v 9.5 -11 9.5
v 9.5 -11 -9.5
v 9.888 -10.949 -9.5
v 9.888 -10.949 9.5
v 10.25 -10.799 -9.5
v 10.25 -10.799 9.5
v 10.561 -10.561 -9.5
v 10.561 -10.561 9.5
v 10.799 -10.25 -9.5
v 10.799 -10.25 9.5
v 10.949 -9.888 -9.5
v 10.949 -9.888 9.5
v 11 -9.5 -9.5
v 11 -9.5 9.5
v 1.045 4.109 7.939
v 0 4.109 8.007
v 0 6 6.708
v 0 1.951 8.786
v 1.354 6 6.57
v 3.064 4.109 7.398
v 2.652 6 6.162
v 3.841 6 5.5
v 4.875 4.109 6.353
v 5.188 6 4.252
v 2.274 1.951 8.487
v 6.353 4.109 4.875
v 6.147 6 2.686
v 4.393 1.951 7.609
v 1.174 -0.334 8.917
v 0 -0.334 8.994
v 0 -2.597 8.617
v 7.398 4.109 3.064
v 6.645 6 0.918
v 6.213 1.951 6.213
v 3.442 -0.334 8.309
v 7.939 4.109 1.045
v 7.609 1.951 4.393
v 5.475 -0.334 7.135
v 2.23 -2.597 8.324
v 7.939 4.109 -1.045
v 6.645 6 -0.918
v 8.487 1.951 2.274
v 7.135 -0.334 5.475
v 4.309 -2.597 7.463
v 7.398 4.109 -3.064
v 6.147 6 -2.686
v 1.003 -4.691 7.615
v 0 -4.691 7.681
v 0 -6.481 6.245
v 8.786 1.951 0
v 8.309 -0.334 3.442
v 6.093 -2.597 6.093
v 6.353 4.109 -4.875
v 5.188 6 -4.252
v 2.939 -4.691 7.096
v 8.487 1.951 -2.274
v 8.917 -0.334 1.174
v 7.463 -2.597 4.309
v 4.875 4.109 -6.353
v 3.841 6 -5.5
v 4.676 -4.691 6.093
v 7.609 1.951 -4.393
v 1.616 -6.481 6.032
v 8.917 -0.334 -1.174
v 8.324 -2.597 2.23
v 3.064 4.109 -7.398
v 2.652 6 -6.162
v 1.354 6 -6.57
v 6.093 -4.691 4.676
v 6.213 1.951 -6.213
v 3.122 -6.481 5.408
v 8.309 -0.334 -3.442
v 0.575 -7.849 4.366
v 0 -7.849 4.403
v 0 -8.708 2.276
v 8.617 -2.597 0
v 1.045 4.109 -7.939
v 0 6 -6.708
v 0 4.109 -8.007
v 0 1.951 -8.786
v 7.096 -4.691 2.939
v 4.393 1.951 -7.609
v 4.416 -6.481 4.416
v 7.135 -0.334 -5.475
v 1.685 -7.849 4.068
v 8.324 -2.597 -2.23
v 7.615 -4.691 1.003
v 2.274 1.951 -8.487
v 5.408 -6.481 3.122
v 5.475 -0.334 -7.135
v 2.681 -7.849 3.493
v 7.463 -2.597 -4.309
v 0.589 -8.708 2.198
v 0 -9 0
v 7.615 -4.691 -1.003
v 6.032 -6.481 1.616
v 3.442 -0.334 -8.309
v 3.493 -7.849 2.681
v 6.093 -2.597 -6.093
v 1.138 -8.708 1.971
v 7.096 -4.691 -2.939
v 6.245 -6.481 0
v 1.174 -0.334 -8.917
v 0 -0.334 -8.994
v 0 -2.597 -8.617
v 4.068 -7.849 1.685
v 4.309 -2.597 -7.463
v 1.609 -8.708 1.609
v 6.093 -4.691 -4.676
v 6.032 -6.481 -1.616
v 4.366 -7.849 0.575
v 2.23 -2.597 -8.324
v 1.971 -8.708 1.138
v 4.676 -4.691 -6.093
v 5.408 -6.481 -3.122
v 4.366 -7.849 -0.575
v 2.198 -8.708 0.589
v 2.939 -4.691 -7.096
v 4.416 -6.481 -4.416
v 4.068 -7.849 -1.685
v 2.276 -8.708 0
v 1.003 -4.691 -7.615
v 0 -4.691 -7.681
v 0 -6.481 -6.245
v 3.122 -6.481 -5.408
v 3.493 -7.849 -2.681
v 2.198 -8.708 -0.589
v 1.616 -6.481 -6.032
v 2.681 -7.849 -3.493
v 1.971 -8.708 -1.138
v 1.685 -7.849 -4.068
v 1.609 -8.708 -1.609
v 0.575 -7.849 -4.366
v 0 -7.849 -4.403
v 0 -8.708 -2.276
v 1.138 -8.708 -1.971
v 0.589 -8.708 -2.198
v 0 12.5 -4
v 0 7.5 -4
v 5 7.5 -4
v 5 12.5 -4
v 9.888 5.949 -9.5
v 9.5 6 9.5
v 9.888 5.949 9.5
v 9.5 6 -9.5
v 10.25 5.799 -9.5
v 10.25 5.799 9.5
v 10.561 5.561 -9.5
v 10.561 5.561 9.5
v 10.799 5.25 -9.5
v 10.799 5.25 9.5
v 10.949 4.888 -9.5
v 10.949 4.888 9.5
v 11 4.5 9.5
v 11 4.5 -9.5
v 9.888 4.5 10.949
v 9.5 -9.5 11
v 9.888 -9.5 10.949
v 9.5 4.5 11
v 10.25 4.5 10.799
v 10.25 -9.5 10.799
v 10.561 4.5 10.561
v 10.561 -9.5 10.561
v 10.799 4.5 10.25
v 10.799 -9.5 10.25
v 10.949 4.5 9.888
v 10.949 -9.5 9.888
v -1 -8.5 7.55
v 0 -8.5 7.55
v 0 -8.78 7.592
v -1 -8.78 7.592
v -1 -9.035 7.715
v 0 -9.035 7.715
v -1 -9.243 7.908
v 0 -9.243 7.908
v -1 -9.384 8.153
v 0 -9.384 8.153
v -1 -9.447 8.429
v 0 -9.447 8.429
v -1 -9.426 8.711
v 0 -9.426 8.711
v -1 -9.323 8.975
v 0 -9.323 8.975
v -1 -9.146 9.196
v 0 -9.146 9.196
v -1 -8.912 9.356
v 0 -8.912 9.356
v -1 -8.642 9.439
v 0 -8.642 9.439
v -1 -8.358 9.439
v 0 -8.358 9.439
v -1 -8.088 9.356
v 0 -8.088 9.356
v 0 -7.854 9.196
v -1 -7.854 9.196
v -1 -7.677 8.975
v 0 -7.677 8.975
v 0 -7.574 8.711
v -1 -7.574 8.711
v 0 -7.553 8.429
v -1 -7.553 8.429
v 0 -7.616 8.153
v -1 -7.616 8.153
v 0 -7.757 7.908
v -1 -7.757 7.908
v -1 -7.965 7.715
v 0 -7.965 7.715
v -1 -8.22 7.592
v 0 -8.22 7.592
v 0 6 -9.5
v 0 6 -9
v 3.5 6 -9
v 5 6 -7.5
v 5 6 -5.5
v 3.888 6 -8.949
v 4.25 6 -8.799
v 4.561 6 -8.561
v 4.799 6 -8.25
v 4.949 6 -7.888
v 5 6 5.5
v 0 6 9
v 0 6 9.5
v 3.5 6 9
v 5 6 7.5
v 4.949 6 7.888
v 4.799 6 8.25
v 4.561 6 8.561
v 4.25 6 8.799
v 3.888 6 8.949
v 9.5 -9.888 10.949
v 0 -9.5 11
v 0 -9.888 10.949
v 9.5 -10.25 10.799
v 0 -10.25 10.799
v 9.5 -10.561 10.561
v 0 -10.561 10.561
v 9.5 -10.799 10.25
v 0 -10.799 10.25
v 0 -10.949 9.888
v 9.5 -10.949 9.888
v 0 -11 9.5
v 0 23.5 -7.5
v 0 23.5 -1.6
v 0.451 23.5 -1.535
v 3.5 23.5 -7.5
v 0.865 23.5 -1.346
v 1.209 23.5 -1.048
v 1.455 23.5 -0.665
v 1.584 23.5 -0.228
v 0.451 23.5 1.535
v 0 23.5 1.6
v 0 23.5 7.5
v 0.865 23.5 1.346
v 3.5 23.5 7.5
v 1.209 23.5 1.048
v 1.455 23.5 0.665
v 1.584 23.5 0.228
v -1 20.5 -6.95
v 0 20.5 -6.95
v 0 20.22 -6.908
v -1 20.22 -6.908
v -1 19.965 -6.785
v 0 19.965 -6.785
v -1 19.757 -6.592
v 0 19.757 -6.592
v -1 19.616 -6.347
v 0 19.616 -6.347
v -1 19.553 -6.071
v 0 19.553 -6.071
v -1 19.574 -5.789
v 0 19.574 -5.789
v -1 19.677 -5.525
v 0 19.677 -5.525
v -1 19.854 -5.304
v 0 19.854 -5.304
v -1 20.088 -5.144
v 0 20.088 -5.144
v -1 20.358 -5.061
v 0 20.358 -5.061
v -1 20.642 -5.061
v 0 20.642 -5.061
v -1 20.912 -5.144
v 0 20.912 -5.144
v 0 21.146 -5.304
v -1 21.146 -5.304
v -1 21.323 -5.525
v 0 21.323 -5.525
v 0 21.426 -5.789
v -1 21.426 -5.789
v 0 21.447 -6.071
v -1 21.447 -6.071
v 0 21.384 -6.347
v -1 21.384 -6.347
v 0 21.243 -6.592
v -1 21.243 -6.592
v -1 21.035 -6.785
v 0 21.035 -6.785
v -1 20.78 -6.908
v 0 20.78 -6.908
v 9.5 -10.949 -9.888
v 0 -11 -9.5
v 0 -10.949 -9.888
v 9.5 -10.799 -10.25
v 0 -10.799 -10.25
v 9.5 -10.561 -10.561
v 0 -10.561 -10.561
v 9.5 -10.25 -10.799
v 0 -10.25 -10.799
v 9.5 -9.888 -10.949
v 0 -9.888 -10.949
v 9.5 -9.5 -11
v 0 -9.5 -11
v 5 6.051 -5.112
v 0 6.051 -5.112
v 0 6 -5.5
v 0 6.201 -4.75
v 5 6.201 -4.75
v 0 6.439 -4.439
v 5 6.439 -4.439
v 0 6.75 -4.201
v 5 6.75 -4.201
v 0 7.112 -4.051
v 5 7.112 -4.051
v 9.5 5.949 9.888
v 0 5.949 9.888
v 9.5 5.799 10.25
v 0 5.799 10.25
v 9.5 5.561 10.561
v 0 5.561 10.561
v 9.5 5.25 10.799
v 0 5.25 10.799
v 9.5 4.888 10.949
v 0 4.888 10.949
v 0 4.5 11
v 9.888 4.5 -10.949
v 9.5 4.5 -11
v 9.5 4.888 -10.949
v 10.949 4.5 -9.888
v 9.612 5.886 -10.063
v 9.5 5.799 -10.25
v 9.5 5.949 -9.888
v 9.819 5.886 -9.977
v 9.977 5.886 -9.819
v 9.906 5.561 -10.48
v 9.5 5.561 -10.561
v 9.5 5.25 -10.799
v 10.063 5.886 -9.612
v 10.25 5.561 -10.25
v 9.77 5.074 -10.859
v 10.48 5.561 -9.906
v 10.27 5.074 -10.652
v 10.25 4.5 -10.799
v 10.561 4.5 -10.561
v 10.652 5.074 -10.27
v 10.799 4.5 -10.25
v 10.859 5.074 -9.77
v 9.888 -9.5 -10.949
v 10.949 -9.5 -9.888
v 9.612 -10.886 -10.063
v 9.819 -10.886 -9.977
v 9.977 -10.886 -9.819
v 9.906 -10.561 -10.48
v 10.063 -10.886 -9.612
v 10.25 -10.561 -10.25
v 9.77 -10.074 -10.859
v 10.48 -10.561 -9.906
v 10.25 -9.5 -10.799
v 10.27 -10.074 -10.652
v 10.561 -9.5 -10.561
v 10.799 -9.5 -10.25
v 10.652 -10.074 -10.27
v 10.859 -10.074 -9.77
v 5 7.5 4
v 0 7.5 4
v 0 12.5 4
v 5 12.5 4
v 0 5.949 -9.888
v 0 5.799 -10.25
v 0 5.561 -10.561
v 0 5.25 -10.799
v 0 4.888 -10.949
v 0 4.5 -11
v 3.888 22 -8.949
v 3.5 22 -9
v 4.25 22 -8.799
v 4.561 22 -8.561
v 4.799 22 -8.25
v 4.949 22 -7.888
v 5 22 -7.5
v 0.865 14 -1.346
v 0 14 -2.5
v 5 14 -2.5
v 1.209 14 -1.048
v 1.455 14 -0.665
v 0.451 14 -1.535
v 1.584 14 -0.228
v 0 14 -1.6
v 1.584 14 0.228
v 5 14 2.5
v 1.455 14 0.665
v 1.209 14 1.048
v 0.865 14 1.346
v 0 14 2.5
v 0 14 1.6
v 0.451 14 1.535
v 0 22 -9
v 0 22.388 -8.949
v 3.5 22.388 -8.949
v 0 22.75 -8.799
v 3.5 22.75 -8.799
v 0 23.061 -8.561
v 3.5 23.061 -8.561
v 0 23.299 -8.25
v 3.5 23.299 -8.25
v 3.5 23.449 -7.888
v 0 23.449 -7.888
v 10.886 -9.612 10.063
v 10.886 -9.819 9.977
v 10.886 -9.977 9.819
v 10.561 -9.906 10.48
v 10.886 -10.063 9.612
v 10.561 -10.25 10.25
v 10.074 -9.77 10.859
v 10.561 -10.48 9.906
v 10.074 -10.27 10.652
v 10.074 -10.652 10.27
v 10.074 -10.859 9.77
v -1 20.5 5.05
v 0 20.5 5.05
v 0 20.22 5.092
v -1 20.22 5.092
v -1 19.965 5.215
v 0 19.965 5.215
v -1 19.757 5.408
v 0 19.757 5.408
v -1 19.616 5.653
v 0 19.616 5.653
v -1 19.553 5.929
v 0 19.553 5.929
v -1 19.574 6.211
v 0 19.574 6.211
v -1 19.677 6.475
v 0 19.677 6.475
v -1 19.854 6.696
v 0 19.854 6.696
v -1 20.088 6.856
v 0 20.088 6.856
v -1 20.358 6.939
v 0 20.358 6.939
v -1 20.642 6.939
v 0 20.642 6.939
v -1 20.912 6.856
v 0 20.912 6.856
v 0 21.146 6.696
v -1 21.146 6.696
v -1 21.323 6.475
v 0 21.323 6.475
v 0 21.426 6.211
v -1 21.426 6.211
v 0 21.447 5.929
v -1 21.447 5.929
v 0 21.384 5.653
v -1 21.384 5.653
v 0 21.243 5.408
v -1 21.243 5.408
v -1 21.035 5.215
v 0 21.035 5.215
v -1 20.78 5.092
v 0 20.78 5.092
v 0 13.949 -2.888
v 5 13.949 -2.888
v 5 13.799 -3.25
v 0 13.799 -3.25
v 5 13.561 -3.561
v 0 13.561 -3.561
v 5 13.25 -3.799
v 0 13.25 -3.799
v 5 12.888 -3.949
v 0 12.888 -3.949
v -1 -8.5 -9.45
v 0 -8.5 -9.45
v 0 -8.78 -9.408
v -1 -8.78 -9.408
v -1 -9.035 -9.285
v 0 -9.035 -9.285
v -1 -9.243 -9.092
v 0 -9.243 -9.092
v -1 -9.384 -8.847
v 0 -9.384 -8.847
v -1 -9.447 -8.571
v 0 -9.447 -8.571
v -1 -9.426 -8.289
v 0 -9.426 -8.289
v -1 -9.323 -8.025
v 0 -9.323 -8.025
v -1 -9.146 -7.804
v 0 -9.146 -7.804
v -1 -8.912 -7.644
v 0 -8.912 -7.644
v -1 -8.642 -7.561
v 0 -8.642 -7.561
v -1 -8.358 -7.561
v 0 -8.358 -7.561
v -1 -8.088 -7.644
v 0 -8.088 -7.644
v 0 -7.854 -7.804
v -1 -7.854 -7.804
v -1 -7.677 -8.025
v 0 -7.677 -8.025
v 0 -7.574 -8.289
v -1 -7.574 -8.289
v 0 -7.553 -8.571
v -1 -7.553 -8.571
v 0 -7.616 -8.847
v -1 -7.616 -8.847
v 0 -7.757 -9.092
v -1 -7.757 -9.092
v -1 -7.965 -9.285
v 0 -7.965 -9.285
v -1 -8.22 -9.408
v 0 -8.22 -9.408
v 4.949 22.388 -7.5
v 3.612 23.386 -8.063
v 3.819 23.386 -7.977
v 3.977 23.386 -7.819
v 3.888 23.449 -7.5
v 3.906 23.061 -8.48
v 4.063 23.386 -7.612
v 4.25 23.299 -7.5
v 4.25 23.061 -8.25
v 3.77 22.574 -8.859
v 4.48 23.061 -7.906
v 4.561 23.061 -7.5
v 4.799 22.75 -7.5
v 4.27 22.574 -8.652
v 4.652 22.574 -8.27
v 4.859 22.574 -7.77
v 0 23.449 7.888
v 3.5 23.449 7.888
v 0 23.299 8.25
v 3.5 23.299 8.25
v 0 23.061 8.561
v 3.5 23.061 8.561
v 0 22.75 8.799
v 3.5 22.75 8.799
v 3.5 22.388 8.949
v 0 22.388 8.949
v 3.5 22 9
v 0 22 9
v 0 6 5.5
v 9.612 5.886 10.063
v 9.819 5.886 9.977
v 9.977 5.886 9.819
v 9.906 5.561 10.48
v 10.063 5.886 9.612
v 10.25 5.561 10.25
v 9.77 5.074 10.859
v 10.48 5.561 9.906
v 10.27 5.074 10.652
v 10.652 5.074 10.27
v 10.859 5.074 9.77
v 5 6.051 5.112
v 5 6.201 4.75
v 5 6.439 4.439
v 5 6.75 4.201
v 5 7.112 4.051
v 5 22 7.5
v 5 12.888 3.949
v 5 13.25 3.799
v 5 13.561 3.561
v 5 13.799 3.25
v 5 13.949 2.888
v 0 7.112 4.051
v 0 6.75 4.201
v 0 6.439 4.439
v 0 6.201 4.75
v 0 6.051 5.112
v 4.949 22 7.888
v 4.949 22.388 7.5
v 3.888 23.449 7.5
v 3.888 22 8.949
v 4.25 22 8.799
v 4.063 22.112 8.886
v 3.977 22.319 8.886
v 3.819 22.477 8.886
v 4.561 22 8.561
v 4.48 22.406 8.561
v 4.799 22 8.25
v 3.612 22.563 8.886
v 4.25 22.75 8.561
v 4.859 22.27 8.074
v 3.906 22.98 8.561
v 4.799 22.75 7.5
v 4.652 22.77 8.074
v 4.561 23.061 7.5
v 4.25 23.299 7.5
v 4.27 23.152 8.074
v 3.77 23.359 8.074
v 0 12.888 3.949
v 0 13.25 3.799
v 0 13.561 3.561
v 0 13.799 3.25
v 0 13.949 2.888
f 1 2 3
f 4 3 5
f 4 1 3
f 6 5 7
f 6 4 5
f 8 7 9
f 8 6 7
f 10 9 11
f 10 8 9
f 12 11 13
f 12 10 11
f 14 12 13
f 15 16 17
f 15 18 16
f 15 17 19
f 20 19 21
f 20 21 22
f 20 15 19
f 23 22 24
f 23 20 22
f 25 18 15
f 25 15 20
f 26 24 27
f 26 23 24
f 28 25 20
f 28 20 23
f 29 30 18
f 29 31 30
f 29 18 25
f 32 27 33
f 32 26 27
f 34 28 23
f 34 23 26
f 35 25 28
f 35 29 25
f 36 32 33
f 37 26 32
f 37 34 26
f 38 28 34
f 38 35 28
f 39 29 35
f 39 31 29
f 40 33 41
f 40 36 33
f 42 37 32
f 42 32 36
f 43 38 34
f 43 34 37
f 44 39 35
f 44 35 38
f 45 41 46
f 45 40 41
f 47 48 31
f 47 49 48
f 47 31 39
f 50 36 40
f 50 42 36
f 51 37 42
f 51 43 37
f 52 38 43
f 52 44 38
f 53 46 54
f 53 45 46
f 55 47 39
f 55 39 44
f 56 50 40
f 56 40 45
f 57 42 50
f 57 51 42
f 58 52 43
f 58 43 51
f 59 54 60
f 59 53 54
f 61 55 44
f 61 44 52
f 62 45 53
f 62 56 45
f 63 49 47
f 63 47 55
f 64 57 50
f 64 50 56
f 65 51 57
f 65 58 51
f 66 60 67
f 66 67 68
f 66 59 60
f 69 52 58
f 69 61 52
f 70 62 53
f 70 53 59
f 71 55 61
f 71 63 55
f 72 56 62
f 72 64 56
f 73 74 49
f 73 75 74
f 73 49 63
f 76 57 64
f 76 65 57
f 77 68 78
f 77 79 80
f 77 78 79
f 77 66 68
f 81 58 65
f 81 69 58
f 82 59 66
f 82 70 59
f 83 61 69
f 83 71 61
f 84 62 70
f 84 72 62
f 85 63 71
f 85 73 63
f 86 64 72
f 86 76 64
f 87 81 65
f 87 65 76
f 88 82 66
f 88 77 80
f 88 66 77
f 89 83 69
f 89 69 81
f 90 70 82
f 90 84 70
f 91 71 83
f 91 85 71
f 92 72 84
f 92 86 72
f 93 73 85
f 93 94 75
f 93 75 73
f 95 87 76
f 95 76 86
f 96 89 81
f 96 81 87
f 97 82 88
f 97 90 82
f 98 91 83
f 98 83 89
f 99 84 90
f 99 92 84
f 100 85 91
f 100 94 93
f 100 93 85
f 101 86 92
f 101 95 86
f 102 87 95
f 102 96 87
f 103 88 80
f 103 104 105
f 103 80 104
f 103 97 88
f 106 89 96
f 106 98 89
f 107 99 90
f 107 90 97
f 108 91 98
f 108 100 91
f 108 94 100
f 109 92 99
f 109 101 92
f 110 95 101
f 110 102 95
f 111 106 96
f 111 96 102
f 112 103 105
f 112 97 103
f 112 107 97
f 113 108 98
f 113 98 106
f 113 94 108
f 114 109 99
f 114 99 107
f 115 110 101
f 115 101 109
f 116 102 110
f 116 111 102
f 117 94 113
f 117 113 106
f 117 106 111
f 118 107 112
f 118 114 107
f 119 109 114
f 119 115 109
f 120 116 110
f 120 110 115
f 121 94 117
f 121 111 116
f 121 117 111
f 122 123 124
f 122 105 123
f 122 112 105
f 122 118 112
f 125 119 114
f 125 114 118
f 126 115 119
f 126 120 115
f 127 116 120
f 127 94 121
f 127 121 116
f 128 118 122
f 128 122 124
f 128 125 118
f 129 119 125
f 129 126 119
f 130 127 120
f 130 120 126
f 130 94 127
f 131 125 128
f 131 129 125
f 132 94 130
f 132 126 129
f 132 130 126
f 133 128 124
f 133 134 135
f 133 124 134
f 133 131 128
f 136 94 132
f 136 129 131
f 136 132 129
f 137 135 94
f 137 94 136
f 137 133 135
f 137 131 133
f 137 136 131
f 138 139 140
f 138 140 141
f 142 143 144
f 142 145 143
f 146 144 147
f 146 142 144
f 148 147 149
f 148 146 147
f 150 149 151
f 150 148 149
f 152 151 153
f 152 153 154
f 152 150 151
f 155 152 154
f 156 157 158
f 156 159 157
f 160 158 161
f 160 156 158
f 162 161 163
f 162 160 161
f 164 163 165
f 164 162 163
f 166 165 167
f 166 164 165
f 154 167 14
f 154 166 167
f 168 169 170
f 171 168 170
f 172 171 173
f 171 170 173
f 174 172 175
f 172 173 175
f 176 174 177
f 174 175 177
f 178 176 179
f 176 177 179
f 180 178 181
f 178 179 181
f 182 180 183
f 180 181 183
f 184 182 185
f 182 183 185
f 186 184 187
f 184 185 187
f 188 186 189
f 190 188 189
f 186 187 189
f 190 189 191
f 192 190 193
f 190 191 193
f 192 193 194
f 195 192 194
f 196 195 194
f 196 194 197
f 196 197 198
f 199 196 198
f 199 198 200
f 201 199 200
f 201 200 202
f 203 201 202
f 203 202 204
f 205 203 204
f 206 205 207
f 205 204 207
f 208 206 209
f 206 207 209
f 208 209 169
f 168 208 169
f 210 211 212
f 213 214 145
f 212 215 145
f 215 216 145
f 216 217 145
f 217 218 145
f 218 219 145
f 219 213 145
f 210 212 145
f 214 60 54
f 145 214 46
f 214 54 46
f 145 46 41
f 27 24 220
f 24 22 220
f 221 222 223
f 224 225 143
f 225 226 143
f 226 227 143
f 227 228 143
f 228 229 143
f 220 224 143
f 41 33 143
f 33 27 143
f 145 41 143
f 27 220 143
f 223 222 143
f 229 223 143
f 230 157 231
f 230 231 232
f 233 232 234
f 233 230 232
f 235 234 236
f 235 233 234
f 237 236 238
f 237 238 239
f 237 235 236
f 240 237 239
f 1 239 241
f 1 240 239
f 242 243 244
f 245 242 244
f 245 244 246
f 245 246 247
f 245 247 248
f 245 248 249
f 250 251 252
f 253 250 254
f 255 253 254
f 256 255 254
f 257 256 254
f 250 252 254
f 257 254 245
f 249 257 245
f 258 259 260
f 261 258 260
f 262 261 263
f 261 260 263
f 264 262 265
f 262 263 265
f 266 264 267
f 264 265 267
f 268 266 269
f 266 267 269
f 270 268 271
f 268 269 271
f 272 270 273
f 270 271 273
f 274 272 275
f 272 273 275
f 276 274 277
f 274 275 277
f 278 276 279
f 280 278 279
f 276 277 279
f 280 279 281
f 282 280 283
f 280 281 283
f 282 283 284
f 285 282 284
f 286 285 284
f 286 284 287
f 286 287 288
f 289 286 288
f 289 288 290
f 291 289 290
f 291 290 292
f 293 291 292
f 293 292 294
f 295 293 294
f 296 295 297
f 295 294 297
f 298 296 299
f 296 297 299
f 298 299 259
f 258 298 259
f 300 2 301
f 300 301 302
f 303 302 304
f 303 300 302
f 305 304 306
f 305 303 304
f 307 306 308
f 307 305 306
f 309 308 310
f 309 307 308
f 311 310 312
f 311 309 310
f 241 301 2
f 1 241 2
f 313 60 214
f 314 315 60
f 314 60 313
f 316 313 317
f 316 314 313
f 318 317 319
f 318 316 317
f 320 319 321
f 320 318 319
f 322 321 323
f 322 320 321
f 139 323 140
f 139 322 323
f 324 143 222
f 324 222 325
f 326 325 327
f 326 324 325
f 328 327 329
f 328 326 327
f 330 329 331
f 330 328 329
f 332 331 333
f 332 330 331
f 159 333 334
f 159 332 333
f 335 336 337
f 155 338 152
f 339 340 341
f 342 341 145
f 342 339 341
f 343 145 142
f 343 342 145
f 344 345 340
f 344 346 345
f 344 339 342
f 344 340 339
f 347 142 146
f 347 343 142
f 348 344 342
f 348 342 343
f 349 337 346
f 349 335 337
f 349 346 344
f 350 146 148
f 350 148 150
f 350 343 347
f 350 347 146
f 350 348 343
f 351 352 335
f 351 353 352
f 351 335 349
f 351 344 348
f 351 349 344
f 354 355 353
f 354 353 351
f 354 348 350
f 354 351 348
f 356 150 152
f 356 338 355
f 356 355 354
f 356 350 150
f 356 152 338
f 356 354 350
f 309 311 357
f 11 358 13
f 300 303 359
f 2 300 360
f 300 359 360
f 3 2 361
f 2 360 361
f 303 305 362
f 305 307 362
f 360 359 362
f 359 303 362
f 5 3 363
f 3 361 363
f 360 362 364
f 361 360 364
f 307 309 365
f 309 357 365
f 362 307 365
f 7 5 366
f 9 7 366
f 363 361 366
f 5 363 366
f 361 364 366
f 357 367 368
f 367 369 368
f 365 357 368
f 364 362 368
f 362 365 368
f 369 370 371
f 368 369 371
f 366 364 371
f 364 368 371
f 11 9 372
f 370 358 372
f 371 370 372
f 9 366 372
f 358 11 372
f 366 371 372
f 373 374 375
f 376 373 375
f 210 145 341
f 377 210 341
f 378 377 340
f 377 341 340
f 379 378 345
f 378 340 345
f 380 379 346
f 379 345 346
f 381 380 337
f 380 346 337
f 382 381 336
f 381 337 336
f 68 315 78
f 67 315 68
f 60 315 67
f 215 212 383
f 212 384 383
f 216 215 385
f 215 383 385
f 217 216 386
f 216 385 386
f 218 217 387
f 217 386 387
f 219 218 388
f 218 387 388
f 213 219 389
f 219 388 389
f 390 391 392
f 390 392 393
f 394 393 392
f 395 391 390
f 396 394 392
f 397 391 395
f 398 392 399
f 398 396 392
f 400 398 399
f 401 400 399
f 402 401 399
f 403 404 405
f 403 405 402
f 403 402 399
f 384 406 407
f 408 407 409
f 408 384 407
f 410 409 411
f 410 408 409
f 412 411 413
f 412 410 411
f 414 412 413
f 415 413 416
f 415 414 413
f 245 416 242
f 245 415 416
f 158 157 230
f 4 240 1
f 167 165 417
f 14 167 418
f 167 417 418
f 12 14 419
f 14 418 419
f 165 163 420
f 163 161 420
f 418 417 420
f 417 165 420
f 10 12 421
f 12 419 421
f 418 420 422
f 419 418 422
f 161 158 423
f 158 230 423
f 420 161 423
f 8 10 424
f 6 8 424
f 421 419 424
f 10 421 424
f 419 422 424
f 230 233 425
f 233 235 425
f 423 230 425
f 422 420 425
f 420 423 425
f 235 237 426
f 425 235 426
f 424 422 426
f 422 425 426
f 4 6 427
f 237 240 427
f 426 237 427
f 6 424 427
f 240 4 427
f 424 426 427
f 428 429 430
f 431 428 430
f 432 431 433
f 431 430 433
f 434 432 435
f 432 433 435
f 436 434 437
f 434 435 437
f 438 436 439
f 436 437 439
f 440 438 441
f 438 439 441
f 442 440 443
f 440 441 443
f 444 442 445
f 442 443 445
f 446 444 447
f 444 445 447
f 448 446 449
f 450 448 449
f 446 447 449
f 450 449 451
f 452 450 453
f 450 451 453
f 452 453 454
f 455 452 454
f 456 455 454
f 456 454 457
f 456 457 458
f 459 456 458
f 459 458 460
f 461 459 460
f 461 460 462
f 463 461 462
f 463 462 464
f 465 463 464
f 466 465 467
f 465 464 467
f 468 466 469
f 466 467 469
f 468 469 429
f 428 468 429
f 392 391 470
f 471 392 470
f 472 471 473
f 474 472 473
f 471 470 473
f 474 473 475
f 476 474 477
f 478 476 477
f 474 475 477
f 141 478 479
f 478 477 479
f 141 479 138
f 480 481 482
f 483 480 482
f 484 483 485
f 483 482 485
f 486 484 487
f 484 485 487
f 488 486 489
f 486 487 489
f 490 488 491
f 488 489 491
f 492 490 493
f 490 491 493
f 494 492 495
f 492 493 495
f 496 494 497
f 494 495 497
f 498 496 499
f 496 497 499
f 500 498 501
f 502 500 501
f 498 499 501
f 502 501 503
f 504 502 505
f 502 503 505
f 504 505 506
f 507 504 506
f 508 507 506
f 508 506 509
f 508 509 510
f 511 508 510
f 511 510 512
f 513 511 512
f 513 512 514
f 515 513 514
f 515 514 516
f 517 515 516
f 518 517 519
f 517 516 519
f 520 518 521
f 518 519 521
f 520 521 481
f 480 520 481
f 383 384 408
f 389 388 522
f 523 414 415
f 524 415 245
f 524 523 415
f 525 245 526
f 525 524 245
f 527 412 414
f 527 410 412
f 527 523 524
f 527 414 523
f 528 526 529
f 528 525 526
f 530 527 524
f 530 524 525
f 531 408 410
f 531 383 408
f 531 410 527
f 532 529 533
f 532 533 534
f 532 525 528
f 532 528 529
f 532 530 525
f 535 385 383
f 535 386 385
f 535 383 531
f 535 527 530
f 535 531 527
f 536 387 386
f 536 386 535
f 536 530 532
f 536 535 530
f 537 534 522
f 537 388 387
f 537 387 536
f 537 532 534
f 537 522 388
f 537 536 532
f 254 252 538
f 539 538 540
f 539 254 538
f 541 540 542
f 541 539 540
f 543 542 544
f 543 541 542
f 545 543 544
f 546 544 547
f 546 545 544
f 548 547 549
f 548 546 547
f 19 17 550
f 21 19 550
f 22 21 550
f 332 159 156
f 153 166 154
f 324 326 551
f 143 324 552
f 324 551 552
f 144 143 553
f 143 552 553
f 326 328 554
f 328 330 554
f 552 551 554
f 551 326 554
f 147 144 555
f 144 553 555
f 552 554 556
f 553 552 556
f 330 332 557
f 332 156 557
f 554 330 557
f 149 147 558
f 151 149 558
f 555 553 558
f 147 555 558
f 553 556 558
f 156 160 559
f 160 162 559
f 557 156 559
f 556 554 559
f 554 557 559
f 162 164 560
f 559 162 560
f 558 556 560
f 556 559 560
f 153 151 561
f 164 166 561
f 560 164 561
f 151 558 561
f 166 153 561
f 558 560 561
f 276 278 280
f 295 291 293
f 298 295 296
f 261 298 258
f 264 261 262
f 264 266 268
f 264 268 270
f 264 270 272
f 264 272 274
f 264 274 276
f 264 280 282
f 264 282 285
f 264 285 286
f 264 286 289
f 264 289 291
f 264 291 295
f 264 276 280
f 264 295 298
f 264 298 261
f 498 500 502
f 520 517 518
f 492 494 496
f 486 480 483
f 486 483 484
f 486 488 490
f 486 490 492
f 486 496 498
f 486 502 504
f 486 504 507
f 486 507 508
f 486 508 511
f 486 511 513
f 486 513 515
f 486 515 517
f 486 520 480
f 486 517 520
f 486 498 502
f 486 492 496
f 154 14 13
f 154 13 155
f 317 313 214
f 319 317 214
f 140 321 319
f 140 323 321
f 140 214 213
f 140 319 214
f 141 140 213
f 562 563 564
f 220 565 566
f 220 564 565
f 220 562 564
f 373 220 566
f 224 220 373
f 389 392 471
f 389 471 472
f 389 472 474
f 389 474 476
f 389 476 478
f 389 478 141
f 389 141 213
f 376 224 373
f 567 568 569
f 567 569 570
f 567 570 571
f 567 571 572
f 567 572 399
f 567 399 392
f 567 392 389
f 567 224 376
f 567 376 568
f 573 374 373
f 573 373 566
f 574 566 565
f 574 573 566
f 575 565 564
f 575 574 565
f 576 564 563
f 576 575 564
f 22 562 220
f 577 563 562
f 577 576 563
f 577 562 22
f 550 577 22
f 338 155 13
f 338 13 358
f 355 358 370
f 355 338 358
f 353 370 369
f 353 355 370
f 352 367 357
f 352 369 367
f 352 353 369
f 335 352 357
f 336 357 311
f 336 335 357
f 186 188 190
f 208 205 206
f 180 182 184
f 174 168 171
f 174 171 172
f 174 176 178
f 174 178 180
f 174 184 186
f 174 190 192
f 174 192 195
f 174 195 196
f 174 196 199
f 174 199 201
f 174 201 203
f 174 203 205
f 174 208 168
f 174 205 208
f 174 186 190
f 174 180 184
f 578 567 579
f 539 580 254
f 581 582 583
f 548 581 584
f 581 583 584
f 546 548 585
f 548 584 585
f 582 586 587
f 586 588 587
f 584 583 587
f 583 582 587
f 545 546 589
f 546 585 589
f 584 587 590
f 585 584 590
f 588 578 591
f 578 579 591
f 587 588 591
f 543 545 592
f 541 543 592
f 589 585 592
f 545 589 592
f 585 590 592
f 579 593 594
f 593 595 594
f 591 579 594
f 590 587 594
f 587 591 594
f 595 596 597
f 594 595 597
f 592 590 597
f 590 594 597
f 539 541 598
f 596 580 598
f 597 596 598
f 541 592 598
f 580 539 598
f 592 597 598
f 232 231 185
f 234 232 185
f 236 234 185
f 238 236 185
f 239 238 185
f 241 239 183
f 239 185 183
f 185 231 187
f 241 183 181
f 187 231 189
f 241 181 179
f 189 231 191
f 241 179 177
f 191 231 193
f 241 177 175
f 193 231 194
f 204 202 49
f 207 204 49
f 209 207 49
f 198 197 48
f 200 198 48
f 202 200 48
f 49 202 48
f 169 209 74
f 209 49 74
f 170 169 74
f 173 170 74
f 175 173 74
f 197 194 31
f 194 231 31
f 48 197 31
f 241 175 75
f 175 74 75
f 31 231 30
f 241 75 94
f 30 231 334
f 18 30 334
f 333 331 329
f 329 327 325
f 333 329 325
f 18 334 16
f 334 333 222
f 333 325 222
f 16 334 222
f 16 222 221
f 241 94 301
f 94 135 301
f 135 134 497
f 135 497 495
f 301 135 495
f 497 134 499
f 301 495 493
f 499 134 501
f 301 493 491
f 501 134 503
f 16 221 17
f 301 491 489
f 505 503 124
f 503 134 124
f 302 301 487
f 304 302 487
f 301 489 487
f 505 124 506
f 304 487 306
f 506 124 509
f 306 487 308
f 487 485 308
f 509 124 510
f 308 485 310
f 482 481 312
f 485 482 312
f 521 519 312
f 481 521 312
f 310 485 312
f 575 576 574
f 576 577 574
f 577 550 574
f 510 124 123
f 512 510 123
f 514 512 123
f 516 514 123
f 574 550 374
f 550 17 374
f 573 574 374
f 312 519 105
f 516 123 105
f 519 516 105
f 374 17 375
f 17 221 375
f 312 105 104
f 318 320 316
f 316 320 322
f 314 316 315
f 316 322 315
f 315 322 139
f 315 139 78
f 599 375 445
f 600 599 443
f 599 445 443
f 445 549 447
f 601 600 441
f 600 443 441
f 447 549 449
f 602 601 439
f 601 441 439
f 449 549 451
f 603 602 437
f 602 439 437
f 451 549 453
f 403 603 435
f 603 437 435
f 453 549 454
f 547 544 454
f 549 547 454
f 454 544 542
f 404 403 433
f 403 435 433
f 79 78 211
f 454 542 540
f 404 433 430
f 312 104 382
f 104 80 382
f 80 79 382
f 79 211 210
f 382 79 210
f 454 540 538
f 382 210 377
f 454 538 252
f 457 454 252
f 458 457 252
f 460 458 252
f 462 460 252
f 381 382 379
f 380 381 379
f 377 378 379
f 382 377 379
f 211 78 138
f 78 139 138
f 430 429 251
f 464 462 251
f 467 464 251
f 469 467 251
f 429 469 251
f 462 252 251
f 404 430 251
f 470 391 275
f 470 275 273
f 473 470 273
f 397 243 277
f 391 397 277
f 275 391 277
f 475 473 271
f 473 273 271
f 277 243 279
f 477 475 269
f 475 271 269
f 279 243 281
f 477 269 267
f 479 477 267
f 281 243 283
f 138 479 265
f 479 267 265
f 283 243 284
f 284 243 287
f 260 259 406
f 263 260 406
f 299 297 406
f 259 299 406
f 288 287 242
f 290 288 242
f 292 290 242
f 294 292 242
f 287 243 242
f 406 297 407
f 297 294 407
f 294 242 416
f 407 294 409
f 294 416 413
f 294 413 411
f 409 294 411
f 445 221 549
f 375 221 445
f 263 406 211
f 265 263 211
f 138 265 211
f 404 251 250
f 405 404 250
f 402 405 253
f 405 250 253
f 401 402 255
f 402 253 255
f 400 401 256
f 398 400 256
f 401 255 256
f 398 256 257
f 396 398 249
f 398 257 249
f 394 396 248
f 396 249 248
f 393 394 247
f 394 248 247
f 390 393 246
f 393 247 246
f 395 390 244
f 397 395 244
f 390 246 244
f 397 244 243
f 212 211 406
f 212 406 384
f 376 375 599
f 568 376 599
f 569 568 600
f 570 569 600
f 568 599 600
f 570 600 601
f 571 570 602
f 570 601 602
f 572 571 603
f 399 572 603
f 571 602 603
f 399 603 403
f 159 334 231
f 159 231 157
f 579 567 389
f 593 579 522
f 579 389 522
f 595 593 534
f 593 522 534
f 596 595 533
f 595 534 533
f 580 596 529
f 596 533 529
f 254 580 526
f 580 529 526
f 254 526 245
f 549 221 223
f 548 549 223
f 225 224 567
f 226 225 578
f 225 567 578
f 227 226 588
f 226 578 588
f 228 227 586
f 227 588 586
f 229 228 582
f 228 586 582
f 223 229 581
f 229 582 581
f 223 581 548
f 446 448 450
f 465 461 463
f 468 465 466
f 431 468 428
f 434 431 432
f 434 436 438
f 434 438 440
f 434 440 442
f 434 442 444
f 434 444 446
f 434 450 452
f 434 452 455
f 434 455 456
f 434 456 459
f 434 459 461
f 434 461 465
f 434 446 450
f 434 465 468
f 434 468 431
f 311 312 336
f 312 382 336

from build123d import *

# Parameters (mm, degrees)
SKETCH_1_W          = 22
SKETCH_1_H          = 17
EXTRUDE_1_DEPTH     = 11
SKETCH_3_W          = 10
SKETCH_3_H          = 17.5
EXTRUDE_2_DEPTH     = 9
SKETCH_4_R          = 1.6
CUT_EXTRUDE_1_DEPTH = 22
SKETCH_5_W          = 8
SKETCH_5_H          = 8
CUT_EXTRUDE_2_DEPTH = 22
FILLET_1_R          = 1.5
FILLET_START        = -6
FILLET_2_DEPTH      = 11
FILLET_START_2      = -5
FILLET_2_2_DEPTH    = 10
SKETCH_7_W          = 37.569031752
SKETCH_7_H          = 53.082934042
CUT_EXTRUDE_4_DEPTH = 22
SKETCH_8_R          = 0.95
EXTRUDE_3_DEPTH     = 1


with BuildPart() as part:
    # 草图1 → 凸台-拉伸1 (new, symmetric)
    with BuildSketch(Plane.XY):
        with Locations((0, -2.5)):
            Rectangle(SKETCH_1_W, SKETCH_1_H)
    extrude(amount=EXTRUDE_1_DEPTH, both=True)

    # 草图2 → 切除-旋转1 (revolve, cut)
    with BuildSketch(Plane.XY, mode=Mode.PRIVATE) as cut_revolve_1_sk:
        with BuildLine():
            Line((0, 6), (6.708203932, 6))
            ThreePointArc((6.708203932, 6), (8.215838363, -3.674234614), (0, -9))
            Line((0, -9), (0, 6))
        make_face()
    revolve(cut_revolve_1_sk.sketch.rotate(Axis((0, 0, 0), (0, 1, 0)), 180), axis=Axis((0, 0, 0), (0, 1, 0)), mode=Mode.SUBTRACT)

    # 草图3 → 凸台-拉伸2 (add, symmetric)
    with BuildSketch(Plane.XY):
        with Locations((0, 14.75)):
            Rectangle(SKETCH_3_W, SKETCH_3_H)
    extrude(amount=EXTRUDE_2_DEPTH, both=True)

    # 草图4 → 切除-拉伸1 (cut)
    with BuildSketch(Plane(origin=(0, 23.5, 0), x_dir=(1, 0, 0), z_dir=(0, 1, 0))):
        with Locations(Location((0, 0, 0), (0, 0, 180))):
            Circle(SKETCH_4_R)
    extrude(amount=-CUT_EXTRUDE_1_DEPTH, mode=Mode.SUBTRACT)

    # 草图5 → 切除-拉伸2 (cut)
    with BuildSketch(Plane.ZY.offset(5)):
        with Locations((0, 10)):
            Rectangle(SKETCH_5_W, SKETCH_5_H)
    extrude(amount=-CUT_EXTRUDE_2_DEPTH, mode=Mode.SUBTRACT)

    # 圆角1
    fillet_1_edges = [part.edges().sort_by_distance(p)[0] for p in [
        (0, -11, 11),
        (11, -2.5, 11),
        (5, 14.75, -9),
        (0, 23.5, -9),
        (5, 23.5, 0),
        (-5, 14.75, -9),
        (-5, 23.5, 0),
        (5, 14.75, 9),
        (0, 23.5, 9),
        (-5, 14.75, 9),
        (0, 6, 11),
        (11, -2.5, -11),
        (0, -11, -11),
        (-11, -2.5, -11),
        (0, 6, -11),
        (11, 6, 0),
        (11, -11, 0),
        (-11, -11, 0),
        (-11, 6, 0),
        (-11, -2.5, 11),
    ]]
    fillet(fillet_1_edges, radius=FILLET_1_R)

    # 圆角2: read off the stored shape, not the designer's step
    # 圆角2 outline → 圆角2 (cut)
    with BuildSketch(Plane.YZ.offset(FILLET_START)):
        with BuildLine():
            Line((6, -4), (6, -5.5))
            ThreePointArc((6, -5.5), (6.439339828, -4.439339828), (7.5, -4))
            Line((7.5, -4), (6, -4))
        make_face()
        with BuildLine():
            Line((6, 4), (7.5, 4))
            ThreePointArc((7.5, 4), (6.439339828, 4.439339828), (6, 5.5))
            Line((6, 5.5), (6, 4))
        make_face()
    extrude(amount=FILLET_2_DEPTH, mode=Mode.SUBTRACT)

    # Fillet 2 2 outline → Fillet 2 2 (add)
    with BuildSketch(Plane.YZ.offset(FILLET_START_2)):
        with BuildLine():
            ThreePointArc((12.5, 4), (13.560660172, 3.560660172), (14, 2.5))
            Line((14, 2.5), (14, 4))
            Line((14, 4), (12.5, 4))
        make_face()
        with BuildLine():
            ThreePointArc((14, -2.5), (13.560660172, -3.560660172), (12.5, -4))
            Line((12.5, -4), (14, -4))
            Line((14, -4), (14, -2.5))
        make_face()
    extrude(amount=FILLET_2_2_DEPTH)

    # 草图7 → 切除-拉伸4 (cut)
    with BuildSketch(Plane(origin=(0, 0, 0), x_dir=(0, 0, -1), z_dir=(1, 0, 0))):
        Rectangle(SKETCH_7_W, SKETCH_7_H)
    extrude(amount=-CUT_EXTRUDE_4_DEPTH, mode=Mode.SUBTRACT)

    # 草图8 → 凸台-拉伸3 (add)
    with BuildSketch(Plane.ZY):
        with Locations(Location((6, 20.5, 0), (0, 0, 180))):
            Circle(SKETCH_8_R)
        with Locations(Location((8.5, -8.5, 0), (0, 0, 180))):
            Circle(SKETCH_8_R)
        with Locations(Location((-6, 20.5, 0), (0, 0, 180))):
            Circle(SKETCH_8_R)
        with Locations(Location((-8.5, -8.5, 0), (0, 0, 180))):
            Circle(SKETCH_8_R)
    extrude(amount=EXTRUDE_3_DEPTH)


solid = part.part
